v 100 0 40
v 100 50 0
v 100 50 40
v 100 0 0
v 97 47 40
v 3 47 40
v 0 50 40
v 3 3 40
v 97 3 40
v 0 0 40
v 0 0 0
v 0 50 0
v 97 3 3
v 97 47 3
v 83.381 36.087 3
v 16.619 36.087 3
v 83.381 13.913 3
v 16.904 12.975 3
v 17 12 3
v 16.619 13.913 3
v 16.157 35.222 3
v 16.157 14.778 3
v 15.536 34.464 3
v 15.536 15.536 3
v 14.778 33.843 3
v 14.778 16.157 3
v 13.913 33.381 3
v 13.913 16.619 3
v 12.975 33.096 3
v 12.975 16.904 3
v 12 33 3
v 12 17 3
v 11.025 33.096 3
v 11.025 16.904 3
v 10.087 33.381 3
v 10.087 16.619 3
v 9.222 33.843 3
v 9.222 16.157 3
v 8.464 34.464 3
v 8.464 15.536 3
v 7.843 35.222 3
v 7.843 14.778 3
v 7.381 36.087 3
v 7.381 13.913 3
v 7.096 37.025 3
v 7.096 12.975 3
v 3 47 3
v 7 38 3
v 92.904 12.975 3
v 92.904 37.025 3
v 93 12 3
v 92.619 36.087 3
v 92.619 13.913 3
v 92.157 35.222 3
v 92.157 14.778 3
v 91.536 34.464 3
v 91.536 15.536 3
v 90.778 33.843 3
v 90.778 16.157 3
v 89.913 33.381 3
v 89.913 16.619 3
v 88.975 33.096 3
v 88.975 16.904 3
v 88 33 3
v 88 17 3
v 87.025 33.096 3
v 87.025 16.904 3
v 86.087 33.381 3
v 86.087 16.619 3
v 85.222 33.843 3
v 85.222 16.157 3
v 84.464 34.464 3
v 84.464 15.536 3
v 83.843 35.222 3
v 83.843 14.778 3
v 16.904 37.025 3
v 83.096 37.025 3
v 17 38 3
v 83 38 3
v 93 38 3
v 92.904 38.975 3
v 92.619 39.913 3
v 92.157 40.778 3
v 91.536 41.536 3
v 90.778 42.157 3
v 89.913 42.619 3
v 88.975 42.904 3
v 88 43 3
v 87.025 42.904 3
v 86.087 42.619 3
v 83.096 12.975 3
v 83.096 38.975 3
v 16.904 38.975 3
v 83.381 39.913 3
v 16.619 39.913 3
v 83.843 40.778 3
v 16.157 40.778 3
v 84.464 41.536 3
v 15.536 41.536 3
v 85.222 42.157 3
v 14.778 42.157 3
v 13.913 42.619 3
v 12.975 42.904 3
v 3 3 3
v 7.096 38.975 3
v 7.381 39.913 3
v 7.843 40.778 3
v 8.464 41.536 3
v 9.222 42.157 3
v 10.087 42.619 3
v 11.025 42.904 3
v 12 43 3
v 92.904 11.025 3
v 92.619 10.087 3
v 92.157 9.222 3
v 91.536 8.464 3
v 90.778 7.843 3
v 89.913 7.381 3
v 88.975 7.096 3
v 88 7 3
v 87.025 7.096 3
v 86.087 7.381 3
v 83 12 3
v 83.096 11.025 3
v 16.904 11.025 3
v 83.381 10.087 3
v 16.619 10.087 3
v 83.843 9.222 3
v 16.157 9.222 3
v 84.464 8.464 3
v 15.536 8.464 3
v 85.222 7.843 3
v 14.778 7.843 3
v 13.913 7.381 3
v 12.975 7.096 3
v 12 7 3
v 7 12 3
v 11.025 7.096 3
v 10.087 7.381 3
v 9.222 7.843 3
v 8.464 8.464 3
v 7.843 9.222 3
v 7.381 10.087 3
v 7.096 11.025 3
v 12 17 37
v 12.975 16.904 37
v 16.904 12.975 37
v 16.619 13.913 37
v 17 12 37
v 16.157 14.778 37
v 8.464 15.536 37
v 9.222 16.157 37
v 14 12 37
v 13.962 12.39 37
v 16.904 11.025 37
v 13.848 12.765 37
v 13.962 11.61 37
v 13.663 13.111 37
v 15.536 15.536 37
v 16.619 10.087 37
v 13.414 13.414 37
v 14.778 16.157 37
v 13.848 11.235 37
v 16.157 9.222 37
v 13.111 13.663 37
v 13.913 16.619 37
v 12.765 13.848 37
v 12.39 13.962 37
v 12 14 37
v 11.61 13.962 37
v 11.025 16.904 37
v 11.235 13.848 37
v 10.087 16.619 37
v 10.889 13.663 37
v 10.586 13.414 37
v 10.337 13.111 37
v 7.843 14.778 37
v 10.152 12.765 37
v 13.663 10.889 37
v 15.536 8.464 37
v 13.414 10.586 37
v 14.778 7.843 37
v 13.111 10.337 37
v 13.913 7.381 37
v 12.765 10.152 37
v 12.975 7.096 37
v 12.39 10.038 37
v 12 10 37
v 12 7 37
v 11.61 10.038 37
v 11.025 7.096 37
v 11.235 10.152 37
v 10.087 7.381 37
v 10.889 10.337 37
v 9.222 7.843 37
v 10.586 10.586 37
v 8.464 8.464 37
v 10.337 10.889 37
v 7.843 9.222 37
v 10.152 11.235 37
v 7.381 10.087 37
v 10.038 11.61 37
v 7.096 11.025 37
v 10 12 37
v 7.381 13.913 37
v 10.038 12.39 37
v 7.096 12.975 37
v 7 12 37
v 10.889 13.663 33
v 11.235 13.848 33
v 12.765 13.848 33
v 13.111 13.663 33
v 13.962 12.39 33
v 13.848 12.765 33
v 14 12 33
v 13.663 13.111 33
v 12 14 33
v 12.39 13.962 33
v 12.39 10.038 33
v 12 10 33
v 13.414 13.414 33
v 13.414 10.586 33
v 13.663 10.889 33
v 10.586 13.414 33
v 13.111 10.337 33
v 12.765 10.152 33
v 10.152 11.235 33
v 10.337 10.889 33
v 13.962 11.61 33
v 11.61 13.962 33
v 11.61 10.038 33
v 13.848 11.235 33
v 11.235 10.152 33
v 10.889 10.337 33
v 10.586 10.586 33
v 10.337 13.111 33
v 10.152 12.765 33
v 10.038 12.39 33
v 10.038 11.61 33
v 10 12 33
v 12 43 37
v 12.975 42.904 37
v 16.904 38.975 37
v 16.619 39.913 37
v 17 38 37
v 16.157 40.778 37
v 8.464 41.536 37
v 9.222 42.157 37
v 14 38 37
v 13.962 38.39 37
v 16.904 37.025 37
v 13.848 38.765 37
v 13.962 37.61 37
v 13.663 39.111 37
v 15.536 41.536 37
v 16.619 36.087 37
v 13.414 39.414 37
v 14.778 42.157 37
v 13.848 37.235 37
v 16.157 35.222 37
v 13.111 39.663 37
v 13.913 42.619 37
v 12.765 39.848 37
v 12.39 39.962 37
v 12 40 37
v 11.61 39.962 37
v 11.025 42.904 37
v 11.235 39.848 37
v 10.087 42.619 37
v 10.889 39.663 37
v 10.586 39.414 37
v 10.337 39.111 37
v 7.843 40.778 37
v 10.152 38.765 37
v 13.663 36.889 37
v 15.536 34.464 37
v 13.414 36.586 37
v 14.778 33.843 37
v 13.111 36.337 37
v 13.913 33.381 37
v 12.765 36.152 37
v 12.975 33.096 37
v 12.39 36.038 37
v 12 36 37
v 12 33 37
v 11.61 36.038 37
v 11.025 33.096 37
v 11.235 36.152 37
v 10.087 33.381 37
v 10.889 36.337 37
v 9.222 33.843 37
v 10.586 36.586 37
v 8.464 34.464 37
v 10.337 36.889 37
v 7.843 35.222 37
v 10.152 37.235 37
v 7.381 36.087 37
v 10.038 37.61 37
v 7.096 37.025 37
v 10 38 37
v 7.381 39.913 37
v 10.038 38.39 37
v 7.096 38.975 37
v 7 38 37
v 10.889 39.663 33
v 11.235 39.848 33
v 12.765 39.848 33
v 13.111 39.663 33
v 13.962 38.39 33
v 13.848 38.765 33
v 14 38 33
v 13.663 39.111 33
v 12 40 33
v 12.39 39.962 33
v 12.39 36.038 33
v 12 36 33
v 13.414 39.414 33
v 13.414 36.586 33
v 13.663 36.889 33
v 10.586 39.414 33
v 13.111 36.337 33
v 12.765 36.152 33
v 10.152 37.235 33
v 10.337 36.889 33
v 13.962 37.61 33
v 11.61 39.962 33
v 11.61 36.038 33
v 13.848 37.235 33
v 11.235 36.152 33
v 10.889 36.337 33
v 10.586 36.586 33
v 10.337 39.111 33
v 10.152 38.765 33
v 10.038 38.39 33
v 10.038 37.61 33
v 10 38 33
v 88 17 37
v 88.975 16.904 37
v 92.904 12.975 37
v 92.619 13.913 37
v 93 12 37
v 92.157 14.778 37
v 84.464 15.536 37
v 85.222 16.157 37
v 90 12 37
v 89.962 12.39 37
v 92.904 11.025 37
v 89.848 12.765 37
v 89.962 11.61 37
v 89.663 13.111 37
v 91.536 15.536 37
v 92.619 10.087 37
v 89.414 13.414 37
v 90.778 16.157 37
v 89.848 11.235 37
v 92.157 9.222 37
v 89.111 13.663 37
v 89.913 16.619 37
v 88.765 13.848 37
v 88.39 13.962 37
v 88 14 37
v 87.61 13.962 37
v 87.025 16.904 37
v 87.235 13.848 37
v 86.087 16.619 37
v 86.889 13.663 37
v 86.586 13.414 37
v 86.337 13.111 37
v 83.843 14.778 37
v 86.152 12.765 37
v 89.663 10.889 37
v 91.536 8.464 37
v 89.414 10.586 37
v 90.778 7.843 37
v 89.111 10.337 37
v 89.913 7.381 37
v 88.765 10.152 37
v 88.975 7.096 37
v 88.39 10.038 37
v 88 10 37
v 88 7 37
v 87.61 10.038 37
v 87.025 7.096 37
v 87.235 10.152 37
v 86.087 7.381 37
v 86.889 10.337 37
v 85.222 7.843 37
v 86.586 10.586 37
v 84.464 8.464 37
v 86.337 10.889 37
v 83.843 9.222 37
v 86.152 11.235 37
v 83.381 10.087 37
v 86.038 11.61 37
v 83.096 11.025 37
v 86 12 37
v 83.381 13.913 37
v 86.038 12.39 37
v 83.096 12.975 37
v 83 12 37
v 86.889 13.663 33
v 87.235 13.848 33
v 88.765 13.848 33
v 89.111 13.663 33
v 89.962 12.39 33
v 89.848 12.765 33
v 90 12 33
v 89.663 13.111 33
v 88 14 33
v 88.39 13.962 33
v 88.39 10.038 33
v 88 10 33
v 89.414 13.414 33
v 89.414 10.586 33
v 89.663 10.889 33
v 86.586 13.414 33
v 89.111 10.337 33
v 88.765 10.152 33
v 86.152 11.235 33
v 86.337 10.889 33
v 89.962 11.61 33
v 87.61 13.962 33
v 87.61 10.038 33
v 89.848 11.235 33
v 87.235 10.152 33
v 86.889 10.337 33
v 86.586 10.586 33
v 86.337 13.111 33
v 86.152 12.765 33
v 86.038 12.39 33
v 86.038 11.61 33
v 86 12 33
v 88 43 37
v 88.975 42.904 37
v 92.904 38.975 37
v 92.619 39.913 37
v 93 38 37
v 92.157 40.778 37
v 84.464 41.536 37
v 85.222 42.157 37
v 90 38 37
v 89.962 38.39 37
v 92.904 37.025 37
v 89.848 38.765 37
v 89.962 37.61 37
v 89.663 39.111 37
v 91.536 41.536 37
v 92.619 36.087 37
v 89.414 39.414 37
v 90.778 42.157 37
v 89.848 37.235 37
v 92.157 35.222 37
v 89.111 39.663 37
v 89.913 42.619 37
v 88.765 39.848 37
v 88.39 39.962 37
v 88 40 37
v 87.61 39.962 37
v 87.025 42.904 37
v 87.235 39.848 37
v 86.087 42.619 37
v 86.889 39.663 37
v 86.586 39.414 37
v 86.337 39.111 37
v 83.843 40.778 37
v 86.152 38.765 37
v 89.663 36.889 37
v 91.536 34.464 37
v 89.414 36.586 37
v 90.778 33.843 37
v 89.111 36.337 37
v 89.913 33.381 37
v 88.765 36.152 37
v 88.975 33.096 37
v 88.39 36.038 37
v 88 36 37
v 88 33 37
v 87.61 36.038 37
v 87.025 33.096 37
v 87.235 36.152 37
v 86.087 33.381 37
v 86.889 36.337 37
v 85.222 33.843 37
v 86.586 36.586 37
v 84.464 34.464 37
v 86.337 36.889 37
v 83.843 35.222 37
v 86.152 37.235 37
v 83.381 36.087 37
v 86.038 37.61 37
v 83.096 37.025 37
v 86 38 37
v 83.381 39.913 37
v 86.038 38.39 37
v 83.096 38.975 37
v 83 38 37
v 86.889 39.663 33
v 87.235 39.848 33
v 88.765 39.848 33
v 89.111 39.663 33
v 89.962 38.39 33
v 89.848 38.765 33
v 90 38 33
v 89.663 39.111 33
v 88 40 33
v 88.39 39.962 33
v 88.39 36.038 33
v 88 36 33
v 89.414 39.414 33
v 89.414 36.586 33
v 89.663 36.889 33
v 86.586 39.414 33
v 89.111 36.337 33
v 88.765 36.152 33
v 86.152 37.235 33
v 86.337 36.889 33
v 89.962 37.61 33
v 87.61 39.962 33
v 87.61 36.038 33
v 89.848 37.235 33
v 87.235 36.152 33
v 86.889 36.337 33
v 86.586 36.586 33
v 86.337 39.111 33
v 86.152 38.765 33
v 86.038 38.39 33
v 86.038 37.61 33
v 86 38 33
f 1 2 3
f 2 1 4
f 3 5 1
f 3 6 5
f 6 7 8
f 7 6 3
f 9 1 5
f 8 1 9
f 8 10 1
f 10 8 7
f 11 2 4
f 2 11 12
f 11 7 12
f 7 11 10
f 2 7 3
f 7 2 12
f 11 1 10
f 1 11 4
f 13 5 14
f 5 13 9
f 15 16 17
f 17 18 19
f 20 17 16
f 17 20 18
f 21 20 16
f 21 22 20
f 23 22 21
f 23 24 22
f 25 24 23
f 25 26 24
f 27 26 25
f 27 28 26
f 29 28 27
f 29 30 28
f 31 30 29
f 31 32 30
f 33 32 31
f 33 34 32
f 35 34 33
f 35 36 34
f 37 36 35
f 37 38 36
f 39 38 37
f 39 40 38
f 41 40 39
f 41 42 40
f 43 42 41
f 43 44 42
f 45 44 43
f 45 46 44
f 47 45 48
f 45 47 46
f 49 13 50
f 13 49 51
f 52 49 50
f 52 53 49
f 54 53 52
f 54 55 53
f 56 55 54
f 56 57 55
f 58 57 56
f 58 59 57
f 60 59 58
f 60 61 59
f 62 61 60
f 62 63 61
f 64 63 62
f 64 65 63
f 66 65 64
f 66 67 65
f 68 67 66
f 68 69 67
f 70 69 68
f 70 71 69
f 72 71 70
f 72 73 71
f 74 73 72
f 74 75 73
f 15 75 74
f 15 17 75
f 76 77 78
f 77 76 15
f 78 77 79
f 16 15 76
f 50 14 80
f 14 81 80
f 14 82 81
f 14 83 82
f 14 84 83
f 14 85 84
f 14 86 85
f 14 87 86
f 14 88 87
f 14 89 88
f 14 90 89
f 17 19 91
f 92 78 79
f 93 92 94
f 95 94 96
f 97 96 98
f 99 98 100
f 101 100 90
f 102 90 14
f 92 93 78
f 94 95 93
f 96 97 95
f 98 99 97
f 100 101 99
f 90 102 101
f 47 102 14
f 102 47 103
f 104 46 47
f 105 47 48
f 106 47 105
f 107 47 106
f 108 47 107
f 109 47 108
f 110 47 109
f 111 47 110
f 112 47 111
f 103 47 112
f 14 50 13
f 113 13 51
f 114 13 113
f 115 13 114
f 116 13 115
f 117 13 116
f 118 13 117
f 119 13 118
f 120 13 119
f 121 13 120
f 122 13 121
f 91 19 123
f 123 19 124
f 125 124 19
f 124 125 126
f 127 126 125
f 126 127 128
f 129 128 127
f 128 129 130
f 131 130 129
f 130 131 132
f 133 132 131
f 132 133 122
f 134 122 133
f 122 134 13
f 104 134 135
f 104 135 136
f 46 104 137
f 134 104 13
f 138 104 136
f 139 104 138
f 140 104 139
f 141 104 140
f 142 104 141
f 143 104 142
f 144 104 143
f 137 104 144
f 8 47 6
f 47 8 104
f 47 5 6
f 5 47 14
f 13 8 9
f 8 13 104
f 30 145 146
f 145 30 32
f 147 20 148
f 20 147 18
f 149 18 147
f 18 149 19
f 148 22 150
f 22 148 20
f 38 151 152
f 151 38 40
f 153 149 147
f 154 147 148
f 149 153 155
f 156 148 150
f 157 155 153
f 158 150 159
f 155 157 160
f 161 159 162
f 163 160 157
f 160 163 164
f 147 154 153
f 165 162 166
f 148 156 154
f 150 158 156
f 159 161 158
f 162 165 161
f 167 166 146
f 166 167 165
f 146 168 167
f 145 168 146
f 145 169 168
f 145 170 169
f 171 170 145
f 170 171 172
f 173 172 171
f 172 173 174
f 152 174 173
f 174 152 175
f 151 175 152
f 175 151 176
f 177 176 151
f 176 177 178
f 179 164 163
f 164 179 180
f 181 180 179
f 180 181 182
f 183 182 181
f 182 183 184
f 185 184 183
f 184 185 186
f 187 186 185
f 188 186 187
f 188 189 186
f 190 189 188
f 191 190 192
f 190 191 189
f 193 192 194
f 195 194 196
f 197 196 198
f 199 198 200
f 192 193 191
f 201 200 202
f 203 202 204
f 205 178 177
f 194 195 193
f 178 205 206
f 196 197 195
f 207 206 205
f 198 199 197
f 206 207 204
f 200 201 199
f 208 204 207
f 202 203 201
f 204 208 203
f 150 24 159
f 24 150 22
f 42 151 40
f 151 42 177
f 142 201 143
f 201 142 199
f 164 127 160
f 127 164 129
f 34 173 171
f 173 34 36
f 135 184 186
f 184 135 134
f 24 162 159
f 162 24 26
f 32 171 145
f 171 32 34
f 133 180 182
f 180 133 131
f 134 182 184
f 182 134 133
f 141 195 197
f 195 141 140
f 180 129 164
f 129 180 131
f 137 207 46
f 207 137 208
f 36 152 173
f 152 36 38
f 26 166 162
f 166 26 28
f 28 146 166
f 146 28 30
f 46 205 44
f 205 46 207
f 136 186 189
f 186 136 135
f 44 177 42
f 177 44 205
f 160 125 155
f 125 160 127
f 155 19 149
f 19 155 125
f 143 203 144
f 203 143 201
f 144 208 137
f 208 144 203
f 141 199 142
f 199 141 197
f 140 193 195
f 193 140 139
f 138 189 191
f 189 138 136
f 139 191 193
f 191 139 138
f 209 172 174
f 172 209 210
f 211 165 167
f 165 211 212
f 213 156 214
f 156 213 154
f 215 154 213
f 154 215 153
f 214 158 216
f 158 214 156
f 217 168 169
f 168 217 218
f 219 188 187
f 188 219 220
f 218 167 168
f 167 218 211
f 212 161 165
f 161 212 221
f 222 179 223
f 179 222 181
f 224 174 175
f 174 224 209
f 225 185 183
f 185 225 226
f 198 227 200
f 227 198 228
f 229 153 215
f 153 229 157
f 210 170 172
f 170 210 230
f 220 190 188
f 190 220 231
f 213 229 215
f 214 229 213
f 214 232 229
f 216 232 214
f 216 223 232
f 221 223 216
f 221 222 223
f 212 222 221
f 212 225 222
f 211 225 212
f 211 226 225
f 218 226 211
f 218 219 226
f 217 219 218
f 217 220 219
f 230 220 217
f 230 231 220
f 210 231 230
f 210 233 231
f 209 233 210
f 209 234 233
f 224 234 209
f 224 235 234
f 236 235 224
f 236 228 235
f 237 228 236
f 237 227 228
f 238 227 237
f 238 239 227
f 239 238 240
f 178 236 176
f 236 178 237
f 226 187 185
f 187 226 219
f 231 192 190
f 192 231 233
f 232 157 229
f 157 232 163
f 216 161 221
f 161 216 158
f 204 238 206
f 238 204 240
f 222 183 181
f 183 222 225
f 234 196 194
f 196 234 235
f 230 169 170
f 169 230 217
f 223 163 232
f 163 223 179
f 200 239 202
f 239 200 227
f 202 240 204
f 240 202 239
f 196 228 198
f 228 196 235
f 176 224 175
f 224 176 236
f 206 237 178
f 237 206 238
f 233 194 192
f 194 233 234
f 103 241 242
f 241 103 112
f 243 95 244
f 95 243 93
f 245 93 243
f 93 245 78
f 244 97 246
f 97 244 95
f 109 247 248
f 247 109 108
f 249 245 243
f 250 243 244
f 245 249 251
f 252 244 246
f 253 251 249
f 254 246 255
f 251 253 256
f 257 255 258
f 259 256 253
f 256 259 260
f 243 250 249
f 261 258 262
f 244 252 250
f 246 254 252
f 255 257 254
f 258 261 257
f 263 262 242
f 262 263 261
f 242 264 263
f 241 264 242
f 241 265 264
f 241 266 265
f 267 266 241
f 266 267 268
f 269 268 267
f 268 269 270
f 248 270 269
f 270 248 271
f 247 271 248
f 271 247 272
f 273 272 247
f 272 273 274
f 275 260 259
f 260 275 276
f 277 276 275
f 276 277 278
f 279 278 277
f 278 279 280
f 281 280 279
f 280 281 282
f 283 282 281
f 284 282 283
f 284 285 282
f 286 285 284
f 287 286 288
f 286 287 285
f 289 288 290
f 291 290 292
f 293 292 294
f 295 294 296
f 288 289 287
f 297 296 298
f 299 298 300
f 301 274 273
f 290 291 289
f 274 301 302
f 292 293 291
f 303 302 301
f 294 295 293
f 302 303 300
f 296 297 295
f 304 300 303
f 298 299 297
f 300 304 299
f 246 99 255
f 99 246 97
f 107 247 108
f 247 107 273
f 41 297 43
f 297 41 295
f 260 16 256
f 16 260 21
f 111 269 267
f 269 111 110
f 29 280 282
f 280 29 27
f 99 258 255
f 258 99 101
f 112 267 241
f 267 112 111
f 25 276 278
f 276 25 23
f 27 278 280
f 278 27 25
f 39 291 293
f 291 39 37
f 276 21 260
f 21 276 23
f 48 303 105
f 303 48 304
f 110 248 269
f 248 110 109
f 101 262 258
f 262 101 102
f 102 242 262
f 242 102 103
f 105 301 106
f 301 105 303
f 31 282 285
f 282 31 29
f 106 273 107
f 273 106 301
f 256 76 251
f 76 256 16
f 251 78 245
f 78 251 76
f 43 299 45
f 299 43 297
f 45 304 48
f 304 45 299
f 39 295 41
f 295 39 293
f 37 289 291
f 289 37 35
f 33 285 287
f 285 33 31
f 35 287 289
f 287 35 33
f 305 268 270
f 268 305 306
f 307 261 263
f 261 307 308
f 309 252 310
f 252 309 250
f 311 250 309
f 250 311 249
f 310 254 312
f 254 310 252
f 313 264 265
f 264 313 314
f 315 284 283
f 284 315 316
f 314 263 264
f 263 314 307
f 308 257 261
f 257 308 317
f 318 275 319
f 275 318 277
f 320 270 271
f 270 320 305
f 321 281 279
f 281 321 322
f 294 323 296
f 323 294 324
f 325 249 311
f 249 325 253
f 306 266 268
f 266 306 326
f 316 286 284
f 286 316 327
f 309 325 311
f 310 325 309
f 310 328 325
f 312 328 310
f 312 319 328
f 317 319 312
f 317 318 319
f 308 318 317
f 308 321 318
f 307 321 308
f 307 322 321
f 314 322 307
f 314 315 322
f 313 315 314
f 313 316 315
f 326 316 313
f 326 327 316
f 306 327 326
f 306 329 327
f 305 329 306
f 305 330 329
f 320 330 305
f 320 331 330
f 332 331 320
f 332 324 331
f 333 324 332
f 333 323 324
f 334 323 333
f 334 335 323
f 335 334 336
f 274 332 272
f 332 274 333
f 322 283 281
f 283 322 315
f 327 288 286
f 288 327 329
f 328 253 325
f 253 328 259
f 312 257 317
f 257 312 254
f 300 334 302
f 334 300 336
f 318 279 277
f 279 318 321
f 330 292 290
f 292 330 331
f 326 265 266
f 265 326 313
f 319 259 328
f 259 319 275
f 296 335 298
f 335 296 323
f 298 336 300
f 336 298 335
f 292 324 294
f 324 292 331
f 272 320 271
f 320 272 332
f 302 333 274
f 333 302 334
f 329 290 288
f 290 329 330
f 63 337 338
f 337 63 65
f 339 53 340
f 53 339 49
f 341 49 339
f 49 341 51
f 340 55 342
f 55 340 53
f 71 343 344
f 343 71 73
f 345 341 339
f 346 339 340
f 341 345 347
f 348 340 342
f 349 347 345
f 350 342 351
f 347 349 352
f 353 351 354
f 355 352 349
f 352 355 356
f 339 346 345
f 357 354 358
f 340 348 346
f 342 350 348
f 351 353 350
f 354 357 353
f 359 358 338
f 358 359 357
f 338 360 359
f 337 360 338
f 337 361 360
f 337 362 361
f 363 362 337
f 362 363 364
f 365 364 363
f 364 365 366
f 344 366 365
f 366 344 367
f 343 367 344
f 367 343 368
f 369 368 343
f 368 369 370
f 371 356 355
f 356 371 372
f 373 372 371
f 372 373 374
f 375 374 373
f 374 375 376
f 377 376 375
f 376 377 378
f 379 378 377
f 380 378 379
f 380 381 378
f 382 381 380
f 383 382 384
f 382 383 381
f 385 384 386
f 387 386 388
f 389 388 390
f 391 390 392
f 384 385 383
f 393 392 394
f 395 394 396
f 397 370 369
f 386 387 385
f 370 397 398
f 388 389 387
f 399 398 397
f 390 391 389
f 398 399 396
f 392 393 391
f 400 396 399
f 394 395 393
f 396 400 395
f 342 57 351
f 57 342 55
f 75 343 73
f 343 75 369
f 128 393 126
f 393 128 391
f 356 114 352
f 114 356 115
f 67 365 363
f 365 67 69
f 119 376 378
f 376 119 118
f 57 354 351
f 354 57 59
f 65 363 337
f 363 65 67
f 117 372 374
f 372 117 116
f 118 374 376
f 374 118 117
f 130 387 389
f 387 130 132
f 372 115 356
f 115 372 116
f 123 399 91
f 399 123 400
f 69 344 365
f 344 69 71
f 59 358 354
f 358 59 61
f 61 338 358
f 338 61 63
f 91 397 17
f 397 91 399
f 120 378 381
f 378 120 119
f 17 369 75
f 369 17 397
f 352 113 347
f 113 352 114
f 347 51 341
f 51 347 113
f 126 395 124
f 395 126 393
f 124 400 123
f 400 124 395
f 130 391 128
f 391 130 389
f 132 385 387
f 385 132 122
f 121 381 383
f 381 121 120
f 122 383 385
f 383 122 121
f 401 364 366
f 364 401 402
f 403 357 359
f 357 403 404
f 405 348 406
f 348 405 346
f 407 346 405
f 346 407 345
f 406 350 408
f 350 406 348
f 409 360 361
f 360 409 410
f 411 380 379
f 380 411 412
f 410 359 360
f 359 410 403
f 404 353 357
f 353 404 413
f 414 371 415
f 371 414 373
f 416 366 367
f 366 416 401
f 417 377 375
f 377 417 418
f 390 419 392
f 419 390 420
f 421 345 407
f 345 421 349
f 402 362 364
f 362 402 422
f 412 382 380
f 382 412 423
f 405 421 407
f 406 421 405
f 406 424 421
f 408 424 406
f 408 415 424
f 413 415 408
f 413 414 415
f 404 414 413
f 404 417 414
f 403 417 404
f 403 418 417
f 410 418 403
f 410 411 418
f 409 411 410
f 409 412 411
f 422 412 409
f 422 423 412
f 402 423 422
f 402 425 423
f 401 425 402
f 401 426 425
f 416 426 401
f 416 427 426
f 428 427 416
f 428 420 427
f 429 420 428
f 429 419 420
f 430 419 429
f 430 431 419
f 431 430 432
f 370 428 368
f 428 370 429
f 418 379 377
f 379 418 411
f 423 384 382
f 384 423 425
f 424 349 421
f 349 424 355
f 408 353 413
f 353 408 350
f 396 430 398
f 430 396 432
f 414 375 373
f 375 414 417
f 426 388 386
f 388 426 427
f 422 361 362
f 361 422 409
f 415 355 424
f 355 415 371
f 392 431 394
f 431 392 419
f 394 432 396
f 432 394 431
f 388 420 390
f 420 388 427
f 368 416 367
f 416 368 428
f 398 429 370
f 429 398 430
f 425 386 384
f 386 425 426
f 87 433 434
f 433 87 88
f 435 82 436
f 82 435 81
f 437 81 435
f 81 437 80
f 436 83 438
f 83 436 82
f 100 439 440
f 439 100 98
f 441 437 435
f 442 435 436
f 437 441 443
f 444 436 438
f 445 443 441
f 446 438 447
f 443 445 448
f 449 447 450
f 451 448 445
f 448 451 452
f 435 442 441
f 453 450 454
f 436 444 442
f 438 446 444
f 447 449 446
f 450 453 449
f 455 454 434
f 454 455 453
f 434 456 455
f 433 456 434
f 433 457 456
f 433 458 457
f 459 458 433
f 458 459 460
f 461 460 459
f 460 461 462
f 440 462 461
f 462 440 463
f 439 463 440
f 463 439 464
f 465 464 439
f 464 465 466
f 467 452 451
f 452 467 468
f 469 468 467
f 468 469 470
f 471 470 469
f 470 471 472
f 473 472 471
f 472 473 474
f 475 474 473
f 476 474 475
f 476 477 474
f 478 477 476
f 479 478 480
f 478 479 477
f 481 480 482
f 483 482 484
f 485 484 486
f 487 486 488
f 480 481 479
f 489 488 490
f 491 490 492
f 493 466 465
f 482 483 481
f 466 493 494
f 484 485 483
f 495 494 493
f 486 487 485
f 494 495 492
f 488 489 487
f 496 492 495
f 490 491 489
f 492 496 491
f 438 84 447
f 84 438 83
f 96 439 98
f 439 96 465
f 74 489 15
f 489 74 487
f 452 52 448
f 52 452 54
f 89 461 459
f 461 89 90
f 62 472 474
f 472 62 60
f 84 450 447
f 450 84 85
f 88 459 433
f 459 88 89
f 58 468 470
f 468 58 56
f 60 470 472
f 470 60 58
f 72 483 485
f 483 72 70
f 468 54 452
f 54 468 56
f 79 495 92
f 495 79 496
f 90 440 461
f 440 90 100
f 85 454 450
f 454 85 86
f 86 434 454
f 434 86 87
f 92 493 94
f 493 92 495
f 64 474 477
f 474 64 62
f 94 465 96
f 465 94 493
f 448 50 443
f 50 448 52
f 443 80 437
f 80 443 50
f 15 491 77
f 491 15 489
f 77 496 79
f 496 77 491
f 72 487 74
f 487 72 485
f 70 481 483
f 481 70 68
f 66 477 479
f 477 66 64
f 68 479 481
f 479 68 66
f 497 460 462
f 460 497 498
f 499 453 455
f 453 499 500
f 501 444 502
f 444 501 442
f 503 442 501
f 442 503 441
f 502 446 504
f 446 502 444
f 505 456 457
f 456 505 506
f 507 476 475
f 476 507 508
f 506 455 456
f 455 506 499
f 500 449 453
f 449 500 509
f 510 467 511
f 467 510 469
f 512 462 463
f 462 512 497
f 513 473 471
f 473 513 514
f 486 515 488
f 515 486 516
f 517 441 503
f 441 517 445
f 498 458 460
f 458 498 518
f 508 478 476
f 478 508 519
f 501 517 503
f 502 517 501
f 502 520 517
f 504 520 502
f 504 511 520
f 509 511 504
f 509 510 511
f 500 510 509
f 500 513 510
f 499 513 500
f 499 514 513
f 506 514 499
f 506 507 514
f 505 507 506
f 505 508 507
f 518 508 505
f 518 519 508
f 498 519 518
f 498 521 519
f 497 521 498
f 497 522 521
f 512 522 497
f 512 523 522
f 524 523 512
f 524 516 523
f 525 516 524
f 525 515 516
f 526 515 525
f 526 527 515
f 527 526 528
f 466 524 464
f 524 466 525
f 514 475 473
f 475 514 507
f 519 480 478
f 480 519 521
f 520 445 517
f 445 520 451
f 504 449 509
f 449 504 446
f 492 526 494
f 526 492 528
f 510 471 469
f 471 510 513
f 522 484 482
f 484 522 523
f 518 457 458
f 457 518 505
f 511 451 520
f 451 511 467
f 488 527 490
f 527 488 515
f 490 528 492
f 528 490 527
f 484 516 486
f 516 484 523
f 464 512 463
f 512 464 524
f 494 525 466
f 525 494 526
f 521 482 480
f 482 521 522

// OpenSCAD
$fn = 32;

// ----------------------------------------------------------------------
// Enclosure box: bosses enclosure
// ----------------------------------------------------------------------

// --- parameters (mm) ---
box_l = 100;              // outer length, X
box_w = 50;               // outer width, Y
box_h = 40;               // outer height
wall_t = 3;               // wall thickness
boss_r = 5;               // corner boss radius
hole_r = 2;               // boss screw hole radius
boss_in = 12;             // boss inset from the corners

inner_h = box_h - wall_t;  // cavity depth
boss_h = inner_h - 2;  // corner boss height

difference() {
  union() {
    difference() {
      cube([box_l, box_w, box_h]);
      translate([wall_t, wall_t, wall_t])
        cube([box_l - 2 * wall_t, box_w - 2 * wall_t, box_h]);
    }
    for (sx = [0, 1], sy = [0, 1])
      translate([sx ? box_l - boss_in : boss_in,
                 sy ? box_w - boss_in : boss_in, wall_t - 1])
        difference() {
          cylinder(r = boss_r, h = boss_h);
          translate([0, 0, boss_h - 4])
            cylinder(r = hole_r, h = 5);
        }
  }
}
